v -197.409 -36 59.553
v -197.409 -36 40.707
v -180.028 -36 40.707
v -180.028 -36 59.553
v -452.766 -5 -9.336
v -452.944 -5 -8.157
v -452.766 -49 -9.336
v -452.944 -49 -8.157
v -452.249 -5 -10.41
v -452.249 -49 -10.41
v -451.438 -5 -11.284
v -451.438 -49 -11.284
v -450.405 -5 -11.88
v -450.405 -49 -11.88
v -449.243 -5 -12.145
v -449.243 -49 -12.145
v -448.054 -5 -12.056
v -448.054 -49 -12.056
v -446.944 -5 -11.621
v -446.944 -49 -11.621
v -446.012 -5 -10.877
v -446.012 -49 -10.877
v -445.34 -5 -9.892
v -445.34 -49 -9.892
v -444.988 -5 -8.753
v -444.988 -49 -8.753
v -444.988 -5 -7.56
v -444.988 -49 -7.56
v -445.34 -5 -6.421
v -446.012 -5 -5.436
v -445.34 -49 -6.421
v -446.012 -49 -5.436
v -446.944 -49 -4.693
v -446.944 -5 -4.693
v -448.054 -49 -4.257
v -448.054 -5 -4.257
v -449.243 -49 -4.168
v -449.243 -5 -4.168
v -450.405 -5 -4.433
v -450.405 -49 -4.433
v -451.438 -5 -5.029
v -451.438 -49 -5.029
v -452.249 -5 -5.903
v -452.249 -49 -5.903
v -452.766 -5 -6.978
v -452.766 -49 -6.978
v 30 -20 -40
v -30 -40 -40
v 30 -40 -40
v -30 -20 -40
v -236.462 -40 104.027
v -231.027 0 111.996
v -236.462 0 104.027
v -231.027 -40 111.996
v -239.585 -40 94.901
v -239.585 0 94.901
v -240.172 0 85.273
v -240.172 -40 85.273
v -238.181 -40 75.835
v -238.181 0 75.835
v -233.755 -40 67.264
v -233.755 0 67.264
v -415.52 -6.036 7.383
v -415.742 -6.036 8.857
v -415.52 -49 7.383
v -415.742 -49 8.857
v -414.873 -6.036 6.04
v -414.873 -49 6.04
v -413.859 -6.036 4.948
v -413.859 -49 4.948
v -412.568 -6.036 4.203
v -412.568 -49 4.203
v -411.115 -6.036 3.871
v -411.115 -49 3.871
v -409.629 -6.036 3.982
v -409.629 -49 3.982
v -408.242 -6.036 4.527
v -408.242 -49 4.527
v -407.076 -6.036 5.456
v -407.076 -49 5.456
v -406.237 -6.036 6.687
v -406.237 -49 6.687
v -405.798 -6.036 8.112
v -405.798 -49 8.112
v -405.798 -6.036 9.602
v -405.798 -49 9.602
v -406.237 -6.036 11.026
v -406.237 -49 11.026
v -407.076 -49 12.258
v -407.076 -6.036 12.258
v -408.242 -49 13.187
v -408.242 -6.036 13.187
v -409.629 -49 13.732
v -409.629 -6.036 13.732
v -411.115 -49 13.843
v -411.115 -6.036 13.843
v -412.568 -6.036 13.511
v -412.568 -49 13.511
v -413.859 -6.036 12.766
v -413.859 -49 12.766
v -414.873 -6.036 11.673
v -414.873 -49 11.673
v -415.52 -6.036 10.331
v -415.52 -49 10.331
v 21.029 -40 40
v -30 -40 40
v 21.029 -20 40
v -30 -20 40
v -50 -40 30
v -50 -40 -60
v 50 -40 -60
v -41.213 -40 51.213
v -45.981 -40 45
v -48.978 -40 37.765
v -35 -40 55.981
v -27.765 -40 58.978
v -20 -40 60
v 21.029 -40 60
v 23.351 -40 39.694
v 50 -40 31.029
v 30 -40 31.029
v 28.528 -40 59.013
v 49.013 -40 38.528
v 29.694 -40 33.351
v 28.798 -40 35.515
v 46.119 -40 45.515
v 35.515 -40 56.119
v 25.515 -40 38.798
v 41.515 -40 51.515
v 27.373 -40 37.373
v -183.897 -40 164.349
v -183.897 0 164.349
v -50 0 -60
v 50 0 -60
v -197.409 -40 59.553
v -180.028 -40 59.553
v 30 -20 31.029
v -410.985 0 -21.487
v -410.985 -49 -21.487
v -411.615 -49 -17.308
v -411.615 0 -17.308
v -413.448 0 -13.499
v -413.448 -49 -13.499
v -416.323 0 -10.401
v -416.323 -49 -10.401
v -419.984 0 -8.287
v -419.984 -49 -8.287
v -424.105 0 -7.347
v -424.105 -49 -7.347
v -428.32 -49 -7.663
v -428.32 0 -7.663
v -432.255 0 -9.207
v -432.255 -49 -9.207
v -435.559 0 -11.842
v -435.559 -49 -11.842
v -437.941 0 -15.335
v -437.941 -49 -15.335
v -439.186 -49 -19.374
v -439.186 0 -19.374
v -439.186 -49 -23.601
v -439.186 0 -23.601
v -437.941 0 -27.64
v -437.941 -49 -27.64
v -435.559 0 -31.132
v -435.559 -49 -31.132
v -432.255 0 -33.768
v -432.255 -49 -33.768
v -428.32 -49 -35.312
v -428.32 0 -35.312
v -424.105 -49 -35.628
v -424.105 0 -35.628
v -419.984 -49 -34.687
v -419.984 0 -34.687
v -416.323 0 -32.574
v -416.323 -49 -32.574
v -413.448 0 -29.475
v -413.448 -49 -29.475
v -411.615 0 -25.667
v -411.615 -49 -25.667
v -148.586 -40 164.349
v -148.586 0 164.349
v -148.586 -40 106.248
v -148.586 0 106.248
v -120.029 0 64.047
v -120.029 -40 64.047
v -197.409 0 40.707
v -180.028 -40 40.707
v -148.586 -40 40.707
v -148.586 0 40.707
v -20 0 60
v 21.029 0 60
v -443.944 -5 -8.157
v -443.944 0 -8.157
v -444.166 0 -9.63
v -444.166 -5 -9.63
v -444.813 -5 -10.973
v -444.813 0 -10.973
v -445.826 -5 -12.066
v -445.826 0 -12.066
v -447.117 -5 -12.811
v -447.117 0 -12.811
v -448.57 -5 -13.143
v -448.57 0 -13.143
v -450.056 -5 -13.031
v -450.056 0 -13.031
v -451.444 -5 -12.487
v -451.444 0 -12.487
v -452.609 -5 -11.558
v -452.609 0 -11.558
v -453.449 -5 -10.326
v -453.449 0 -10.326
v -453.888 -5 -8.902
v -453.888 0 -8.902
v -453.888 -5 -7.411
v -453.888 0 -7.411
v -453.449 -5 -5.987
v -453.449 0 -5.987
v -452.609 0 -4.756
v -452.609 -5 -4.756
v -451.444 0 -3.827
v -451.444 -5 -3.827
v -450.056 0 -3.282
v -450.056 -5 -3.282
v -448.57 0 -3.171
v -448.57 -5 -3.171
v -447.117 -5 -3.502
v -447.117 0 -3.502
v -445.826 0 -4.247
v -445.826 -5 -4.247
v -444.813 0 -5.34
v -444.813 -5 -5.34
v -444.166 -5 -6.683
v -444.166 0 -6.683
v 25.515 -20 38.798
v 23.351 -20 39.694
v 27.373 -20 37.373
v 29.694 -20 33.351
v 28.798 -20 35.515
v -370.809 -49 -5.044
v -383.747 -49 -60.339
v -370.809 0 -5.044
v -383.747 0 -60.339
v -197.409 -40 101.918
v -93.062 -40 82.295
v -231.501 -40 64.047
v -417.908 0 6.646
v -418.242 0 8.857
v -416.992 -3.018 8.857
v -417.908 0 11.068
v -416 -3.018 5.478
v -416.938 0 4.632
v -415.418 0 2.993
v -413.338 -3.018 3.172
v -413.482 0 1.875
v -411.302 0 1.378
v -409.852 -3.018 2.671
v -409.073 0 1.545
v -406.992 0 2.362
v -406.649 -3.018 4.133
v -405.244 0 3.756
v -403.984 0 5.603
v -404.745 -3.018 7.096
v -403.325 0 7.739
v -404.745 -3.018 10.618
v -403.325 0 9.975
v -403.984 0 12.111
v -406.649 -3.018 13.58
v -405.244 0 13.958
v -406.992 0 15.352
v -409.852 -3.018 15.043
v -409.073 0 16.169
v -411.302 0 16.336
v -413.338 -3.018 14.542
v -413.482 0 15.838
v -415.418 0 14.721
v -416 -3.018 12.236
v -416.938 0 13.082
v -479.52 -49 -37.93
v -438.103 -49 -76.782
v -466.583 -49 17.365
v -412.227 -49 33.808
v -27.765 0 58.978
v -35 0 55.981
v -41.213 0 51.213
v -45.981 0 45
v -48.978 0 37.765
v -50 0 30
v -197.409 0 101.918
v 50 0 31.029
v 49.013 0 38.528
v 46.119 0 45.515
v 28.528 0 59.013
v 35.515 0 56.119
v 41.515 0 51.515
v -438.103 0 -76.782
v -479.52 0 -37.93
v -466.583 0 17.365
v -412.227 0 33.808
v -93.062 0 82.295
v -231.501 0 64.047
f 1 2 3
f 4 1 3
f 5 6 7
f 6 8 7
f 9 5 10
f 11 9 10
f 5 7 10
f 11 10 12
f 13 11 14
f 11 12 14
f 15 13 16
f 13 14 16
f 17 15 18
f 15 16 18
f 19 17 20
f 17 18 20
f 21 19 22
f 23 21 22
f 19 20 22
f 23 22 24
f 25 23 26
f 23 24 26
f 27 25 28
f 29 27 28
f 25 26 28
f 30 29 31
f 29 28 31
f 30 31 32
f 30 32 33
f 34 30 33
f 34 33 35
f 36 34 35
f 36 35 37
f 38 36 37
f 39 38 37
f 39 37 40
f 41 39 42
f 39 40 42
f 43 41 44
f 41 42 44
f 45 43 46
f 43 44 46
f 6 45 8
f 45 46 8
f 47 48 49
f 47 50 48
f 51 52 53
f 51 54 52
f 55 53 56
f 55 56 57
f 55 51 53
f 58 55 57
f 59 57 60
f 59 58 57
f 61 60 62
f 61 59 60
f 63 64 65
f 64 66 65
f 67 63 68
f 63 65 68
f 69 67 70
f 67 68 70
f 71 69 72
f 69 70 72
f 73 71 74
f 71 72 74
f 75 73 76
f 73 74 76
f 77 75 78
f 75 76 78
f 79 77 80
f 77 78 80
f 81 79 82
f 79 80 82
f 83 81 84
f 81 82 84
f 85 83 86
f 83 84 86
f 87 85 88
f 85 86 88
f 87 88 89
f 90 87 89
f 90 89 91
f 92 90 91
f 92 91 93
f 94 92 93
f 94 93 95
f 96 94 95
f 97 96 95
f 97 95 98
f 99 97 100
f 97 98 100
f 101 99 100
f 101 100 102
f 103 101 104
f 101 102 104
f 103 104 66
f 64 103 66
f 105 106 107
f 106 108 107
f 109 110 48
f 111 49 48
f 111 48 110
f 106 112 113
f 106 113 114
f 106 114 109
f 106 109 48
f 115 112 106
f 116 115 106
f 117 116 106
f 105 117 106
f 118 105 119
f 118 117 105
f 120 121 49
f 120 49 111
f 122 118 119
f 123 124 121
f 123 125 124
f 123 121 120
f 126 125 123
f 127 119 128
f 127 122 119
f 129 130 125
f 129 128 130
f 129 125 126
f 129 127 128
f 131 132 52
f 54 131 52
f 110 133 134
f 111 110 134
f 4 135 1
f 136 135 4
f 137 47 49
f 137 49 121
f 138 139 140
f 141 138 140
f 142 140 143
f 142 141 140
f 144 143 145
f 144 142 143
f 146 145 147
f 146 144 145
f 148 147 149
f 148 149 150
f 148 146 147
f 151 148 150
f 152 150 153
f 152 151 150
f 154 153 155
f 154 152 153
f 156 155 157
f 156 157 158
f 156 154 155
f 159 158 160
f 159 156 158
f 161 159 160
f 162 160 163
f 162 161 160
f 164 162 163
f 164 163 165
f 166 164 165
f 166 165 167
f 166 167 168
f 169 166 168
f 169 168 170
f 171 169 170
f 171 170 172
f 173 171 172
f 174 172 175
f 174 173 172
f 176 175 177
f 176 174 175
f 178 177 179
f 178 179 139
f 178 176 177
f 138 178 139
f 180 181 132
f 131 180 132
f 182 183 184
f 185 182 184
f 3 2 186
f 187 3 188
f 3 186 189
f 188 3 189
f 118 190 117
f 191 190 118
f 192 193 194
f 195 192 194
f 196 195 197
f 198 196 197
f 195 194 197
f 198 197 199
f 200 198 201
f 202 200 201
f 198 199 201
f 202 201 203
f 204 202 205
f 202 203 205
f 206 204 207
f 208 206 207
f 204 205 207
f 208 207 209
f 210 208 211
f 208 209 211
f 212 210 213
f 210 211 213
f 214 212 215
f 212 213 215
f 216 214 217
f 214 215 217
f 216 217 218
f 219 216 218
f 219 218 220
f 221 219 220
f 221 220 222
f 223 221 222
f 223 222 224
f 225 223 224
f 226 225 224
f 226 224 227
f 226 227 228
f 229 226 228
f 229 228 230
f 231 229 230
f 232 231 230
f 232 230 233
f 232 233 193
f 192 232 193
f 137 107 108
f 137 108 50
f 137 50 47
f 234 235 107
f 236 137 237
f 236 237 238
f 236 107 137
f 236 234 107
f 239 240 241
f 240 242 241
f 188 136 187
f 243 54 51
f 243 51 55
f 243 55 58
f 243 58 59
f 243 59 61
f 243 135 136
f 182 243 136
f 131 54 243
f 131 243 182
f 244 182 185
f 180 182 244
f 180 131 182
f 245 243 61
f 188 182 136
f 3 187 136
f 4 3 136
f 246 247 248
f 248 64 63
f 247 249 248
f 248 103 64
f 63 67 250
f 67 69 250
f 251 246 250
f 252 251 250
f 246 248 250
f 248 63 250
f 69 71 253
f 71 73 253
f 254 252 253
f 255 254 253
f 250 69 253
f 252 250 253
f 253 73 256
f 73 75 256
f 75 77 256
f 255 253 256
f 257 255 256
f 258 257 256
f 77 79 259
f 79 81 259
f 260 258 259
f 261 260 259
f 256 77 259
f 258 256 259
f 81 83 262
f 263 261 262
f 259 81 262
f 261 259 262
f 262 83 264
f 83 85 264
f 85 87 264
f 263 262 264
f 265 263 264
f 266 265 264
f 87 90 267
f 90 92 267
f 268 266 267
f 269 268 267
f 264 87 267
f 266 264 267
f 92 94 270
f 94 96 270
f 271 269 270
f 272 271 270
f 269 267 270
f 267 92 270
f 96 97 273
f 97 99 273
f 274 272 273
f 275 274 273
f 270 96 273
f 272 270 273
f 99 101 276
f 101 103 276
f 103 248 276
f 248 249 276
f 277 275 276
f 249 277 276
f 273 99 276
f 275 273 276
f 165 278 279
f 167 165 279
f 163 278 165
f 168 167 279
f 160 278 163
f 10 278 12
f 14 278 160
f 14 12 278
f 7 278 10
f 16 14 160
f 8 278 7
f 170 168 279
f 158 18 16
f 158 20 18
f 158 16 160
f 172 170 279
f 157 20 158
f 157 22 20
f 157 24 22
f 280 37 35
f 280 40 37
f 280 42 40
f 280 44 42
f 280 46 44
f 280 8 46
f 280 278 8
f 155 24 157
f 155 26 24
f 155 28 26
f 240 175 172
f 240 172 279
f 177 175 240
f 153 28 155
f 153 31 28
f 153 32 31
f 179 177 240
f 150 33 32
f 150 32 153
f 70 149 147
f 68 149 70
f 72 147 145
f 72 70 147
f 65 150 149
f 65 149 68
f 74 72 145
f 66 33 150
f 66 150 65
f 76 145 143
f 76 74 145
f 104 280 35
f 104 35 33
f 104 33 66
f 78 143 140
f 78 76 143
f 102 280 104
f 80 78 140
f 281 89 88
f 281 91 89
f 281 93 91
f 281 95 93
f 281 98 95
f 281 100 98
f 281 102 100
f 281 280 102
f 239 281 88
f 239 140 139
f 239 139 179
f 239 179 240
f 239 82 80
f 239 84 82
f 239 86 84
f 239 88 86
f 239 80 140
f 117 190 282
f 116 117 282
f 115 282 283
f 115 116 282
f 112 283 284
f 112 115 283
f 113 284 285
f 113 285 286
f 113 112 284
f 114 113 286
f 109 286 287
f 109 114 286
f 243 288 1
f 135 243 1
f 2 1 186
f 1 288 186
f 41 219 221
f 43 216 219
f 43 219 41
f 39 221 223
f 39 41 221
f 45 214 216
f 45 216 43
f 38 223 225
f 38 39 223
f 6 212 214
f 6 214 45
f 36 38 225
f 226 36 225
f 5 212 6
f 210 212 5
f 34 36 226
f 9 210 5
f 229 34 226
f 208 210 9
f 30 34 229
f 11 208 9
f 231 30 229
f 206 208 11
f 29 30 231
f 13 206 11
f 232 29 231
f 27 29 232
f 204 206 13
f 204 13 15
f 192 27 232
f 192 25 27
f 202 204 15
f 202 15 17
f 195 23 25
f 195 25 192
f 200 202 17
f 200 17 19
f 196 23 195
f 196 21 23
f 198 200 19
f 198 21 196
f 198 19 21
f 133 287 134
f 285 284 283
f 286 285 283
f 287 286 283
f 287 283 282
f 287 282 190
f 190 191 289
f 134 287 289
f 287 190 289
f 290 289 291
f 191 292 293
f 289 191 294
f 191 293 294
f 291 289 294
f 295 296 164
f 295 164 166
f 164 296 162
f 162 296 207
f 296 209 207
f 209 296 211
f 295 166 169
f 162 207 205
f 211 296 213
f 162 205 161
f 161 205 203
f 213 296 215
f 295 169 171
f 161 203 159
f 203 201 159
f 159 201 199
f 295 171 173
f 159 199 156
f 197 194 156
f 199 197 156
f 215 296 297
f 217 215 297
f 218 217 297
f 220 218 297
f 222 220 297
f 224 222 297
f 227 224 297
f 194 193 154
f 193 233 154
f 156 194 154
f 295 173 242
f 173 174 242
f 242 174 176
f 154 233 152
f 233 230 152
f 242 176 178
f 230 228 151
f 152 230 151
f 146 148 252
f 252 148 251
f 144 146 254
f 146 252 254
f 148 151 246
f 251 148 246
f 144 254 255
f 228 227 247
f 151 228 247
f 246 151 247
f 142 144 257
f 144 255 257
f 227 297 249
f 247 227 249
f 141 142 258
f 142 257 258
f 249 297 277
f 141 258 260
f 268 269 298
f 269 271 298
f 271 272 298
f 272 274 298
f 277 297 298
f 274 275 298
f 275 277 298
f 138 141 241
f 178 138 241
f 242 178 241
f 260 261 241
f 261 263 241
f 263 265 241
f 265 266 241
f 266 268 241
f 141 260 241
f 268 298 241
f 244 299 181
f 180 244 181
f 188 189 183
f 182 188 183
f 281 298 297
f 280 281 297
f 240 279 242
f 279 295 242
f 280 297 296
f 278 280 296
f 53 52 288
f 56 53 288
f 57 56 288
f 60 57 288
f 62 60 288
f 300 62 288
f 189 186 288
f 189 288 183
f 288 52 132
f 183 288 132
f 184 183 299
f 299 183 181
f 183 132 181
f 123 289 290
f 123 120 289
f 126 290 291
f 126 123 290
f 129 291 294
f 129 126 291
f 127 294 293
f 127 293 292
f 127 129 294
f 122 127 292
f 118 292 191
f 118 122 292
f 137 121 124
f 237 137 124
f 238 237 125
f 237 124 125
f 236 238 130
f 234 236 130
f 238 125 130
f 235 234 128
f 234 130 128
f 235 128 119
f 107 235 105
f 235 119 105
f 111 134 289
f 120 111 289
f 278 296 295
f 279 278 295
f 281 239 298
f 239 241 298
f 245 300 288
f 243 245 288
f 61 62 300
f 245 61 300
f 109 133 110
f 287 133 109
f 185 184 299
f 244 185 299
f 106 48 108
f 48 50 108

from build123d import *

# Parameters (mm, degrees)
F0_W            = 100
F0_H            = 120
F1_DEPTH        = 40
F0_R            = 14.1801468362
F2_R            = 28.9705627485
F3_T            = -20
F4_R            = 30
F5_R            = 14.1801468362
F6_DEPTH        = 9
F8_D            = 10
F8_CSINK_D      = 15
F8_CSINK_ANGLE  = 45
F9_R            = 35.9918588335
F10_D           = 8
F10_CBORE_D     = 10
F10_CBORE_DEPTH = 5
F11_W           = 39.1712635756
F11_H           = 31.8527948111
F12_DEPTH       = 35


with BuildPart() as f1:
    # F0 (on Front) → F1 (new body)
    with BuildSketch(Plane.XZ):
        Rectangle(F0_W, F0_H)
    extrude(amount=F1_DEPTH)

    # F2
    f2_edges = [f1.edges().sort_by_distance(p)[0] for p in [
        (50, -20, 60),
    ]]
    fillet(f2_edges, radius=F2_R)

    # F3
    f3_openings = [f1.faces().sort_by_distance(p)[0] for p in [
        (-0.663303, -40, -0.815685),
    ]]
    offset(amount=F3_T, openings=f3_openings)

    # F4
    f4_edges = [f1.edges().sort_by_distance(p)[0] for p in [
        (-50, -20, 60),
    ]]
    fillet(f4_edges, radius=F4_R)


with BuildPart() as f1b:
    # F0 (on Front) → F1, piece 2 (new body)
    with BuildSketch(Plane.XZ):
        Polygon((-183.8974500989, 164.3493920565), (-250.1836888026, 90.7151665284), (-231.5011774537, 64.0467909076), (-197.4093313992, 101.9177989801), (-197.4093313992, 40.7066182783), (-148.5862582922, 40.7066182783), (-148.5862582922, 106.2484012785), (-120.0294499633, 64.0467909076), (-93.062030872, 82.294990712), (-148.5862582922, 164.3493920565), align=None)
    extrude(amount=F1_DEPTH)

    # F9
    f9_edges = [f1b.edges().sort_by_distance(p)[0] for p in [
        (-250.183689, -20, 90.715167),
    ]]
    fillet(f9_edges, radius=F9_R)

    # F11 (on offset) → F12 (cut)
    with BuildSketch(Plane.XZ.offset(71)):
        with Locations((-199.6132209897, 43.6267340556)):
            Rectangle(F11_W, F11_H)
    extrude(amount=-F12_DEPTH, mode=Mode.SUBTRACT)


with BuildPart() as f1c:
    # F0 (on Front) → F1, piece 3 (new body)
    with BuildSketch(Plane.XZ):
        Polygon((-438.1025420747, -76.7821108959), (-383.7468040862, -60.3391790726), (-370.8089317636, -5.0442632215), (-412.2267974295, 33.8077208064), (-466.582535418, 17.3647889831), (-479.5204077406, -37.9301268681), align=None)
        with Locations((-425.1646697521, -21.4871950448)):
            Circle(F0_R, mode=Mode.SUBTRACT)
    extrude(amount=F1_DEPTH)

    # F5 (on face) + F0 (on Front) → F6 (join)
    with BuildSketch(Plane.XZ.offset(40)):
        Polygon((-479.5204077406, -37.9301268681), (-438.1025420747, -76.7821108959), (-383.7468040862, -60.3391790726), (-370.8089317636, -5.0442632215), (-412.2267974295, 33.8077208064), (-466.582535418, 17.3647889831), align=None)
        with Locations((-425.1646697521, -21.4871950448)):
            Circle(F5_R, mode=Mode.SUBTRACT)
    with BuildSketch(Plane.XZ):
        Polygon((-438.1025420747, -76.7821108959), (-383.7468040862, -60.3391790726), (-370.8089317636, -5.0442632215), (-412.2267974295, 33.8077208064), (-466.582535418, 17.3647889831), (-479.5204077406, -37.9301268681), align=None)
        with Locations((-425.1646697521, -21.4871950448)):
            Circle(F0_R, mode=Mode.SUBTRACT)
    extrude(amount=F6_DEPTH)

    # F8 (through all)
    with Locations(Plane(origin=(0, 0, 0), x_dir=(1, 0, 0), z_dir=(0, 1, 0))):
        with Locations((-410.741686821, -8.8568972424)):
            CounterSinkHole(F8_D / 2, F8_CSINK_D / 2, counter_sink_angle=F8_CSINK_ANGLE)

    # F10 (through all)
    with Locations(Plane(origin=(0, 0, 0), x_dir=(1, 0, 0), z_dir=(0, 1, 0))):
        with Locations((-448.9437639713, 8.1566572189)):
            CounterBoreHole(F10_D / 2, F10_CBORE_D / 2, F10_CBORE_DEPTH)


solid = Compound([f1.part, f1b.part, f1c.part])
